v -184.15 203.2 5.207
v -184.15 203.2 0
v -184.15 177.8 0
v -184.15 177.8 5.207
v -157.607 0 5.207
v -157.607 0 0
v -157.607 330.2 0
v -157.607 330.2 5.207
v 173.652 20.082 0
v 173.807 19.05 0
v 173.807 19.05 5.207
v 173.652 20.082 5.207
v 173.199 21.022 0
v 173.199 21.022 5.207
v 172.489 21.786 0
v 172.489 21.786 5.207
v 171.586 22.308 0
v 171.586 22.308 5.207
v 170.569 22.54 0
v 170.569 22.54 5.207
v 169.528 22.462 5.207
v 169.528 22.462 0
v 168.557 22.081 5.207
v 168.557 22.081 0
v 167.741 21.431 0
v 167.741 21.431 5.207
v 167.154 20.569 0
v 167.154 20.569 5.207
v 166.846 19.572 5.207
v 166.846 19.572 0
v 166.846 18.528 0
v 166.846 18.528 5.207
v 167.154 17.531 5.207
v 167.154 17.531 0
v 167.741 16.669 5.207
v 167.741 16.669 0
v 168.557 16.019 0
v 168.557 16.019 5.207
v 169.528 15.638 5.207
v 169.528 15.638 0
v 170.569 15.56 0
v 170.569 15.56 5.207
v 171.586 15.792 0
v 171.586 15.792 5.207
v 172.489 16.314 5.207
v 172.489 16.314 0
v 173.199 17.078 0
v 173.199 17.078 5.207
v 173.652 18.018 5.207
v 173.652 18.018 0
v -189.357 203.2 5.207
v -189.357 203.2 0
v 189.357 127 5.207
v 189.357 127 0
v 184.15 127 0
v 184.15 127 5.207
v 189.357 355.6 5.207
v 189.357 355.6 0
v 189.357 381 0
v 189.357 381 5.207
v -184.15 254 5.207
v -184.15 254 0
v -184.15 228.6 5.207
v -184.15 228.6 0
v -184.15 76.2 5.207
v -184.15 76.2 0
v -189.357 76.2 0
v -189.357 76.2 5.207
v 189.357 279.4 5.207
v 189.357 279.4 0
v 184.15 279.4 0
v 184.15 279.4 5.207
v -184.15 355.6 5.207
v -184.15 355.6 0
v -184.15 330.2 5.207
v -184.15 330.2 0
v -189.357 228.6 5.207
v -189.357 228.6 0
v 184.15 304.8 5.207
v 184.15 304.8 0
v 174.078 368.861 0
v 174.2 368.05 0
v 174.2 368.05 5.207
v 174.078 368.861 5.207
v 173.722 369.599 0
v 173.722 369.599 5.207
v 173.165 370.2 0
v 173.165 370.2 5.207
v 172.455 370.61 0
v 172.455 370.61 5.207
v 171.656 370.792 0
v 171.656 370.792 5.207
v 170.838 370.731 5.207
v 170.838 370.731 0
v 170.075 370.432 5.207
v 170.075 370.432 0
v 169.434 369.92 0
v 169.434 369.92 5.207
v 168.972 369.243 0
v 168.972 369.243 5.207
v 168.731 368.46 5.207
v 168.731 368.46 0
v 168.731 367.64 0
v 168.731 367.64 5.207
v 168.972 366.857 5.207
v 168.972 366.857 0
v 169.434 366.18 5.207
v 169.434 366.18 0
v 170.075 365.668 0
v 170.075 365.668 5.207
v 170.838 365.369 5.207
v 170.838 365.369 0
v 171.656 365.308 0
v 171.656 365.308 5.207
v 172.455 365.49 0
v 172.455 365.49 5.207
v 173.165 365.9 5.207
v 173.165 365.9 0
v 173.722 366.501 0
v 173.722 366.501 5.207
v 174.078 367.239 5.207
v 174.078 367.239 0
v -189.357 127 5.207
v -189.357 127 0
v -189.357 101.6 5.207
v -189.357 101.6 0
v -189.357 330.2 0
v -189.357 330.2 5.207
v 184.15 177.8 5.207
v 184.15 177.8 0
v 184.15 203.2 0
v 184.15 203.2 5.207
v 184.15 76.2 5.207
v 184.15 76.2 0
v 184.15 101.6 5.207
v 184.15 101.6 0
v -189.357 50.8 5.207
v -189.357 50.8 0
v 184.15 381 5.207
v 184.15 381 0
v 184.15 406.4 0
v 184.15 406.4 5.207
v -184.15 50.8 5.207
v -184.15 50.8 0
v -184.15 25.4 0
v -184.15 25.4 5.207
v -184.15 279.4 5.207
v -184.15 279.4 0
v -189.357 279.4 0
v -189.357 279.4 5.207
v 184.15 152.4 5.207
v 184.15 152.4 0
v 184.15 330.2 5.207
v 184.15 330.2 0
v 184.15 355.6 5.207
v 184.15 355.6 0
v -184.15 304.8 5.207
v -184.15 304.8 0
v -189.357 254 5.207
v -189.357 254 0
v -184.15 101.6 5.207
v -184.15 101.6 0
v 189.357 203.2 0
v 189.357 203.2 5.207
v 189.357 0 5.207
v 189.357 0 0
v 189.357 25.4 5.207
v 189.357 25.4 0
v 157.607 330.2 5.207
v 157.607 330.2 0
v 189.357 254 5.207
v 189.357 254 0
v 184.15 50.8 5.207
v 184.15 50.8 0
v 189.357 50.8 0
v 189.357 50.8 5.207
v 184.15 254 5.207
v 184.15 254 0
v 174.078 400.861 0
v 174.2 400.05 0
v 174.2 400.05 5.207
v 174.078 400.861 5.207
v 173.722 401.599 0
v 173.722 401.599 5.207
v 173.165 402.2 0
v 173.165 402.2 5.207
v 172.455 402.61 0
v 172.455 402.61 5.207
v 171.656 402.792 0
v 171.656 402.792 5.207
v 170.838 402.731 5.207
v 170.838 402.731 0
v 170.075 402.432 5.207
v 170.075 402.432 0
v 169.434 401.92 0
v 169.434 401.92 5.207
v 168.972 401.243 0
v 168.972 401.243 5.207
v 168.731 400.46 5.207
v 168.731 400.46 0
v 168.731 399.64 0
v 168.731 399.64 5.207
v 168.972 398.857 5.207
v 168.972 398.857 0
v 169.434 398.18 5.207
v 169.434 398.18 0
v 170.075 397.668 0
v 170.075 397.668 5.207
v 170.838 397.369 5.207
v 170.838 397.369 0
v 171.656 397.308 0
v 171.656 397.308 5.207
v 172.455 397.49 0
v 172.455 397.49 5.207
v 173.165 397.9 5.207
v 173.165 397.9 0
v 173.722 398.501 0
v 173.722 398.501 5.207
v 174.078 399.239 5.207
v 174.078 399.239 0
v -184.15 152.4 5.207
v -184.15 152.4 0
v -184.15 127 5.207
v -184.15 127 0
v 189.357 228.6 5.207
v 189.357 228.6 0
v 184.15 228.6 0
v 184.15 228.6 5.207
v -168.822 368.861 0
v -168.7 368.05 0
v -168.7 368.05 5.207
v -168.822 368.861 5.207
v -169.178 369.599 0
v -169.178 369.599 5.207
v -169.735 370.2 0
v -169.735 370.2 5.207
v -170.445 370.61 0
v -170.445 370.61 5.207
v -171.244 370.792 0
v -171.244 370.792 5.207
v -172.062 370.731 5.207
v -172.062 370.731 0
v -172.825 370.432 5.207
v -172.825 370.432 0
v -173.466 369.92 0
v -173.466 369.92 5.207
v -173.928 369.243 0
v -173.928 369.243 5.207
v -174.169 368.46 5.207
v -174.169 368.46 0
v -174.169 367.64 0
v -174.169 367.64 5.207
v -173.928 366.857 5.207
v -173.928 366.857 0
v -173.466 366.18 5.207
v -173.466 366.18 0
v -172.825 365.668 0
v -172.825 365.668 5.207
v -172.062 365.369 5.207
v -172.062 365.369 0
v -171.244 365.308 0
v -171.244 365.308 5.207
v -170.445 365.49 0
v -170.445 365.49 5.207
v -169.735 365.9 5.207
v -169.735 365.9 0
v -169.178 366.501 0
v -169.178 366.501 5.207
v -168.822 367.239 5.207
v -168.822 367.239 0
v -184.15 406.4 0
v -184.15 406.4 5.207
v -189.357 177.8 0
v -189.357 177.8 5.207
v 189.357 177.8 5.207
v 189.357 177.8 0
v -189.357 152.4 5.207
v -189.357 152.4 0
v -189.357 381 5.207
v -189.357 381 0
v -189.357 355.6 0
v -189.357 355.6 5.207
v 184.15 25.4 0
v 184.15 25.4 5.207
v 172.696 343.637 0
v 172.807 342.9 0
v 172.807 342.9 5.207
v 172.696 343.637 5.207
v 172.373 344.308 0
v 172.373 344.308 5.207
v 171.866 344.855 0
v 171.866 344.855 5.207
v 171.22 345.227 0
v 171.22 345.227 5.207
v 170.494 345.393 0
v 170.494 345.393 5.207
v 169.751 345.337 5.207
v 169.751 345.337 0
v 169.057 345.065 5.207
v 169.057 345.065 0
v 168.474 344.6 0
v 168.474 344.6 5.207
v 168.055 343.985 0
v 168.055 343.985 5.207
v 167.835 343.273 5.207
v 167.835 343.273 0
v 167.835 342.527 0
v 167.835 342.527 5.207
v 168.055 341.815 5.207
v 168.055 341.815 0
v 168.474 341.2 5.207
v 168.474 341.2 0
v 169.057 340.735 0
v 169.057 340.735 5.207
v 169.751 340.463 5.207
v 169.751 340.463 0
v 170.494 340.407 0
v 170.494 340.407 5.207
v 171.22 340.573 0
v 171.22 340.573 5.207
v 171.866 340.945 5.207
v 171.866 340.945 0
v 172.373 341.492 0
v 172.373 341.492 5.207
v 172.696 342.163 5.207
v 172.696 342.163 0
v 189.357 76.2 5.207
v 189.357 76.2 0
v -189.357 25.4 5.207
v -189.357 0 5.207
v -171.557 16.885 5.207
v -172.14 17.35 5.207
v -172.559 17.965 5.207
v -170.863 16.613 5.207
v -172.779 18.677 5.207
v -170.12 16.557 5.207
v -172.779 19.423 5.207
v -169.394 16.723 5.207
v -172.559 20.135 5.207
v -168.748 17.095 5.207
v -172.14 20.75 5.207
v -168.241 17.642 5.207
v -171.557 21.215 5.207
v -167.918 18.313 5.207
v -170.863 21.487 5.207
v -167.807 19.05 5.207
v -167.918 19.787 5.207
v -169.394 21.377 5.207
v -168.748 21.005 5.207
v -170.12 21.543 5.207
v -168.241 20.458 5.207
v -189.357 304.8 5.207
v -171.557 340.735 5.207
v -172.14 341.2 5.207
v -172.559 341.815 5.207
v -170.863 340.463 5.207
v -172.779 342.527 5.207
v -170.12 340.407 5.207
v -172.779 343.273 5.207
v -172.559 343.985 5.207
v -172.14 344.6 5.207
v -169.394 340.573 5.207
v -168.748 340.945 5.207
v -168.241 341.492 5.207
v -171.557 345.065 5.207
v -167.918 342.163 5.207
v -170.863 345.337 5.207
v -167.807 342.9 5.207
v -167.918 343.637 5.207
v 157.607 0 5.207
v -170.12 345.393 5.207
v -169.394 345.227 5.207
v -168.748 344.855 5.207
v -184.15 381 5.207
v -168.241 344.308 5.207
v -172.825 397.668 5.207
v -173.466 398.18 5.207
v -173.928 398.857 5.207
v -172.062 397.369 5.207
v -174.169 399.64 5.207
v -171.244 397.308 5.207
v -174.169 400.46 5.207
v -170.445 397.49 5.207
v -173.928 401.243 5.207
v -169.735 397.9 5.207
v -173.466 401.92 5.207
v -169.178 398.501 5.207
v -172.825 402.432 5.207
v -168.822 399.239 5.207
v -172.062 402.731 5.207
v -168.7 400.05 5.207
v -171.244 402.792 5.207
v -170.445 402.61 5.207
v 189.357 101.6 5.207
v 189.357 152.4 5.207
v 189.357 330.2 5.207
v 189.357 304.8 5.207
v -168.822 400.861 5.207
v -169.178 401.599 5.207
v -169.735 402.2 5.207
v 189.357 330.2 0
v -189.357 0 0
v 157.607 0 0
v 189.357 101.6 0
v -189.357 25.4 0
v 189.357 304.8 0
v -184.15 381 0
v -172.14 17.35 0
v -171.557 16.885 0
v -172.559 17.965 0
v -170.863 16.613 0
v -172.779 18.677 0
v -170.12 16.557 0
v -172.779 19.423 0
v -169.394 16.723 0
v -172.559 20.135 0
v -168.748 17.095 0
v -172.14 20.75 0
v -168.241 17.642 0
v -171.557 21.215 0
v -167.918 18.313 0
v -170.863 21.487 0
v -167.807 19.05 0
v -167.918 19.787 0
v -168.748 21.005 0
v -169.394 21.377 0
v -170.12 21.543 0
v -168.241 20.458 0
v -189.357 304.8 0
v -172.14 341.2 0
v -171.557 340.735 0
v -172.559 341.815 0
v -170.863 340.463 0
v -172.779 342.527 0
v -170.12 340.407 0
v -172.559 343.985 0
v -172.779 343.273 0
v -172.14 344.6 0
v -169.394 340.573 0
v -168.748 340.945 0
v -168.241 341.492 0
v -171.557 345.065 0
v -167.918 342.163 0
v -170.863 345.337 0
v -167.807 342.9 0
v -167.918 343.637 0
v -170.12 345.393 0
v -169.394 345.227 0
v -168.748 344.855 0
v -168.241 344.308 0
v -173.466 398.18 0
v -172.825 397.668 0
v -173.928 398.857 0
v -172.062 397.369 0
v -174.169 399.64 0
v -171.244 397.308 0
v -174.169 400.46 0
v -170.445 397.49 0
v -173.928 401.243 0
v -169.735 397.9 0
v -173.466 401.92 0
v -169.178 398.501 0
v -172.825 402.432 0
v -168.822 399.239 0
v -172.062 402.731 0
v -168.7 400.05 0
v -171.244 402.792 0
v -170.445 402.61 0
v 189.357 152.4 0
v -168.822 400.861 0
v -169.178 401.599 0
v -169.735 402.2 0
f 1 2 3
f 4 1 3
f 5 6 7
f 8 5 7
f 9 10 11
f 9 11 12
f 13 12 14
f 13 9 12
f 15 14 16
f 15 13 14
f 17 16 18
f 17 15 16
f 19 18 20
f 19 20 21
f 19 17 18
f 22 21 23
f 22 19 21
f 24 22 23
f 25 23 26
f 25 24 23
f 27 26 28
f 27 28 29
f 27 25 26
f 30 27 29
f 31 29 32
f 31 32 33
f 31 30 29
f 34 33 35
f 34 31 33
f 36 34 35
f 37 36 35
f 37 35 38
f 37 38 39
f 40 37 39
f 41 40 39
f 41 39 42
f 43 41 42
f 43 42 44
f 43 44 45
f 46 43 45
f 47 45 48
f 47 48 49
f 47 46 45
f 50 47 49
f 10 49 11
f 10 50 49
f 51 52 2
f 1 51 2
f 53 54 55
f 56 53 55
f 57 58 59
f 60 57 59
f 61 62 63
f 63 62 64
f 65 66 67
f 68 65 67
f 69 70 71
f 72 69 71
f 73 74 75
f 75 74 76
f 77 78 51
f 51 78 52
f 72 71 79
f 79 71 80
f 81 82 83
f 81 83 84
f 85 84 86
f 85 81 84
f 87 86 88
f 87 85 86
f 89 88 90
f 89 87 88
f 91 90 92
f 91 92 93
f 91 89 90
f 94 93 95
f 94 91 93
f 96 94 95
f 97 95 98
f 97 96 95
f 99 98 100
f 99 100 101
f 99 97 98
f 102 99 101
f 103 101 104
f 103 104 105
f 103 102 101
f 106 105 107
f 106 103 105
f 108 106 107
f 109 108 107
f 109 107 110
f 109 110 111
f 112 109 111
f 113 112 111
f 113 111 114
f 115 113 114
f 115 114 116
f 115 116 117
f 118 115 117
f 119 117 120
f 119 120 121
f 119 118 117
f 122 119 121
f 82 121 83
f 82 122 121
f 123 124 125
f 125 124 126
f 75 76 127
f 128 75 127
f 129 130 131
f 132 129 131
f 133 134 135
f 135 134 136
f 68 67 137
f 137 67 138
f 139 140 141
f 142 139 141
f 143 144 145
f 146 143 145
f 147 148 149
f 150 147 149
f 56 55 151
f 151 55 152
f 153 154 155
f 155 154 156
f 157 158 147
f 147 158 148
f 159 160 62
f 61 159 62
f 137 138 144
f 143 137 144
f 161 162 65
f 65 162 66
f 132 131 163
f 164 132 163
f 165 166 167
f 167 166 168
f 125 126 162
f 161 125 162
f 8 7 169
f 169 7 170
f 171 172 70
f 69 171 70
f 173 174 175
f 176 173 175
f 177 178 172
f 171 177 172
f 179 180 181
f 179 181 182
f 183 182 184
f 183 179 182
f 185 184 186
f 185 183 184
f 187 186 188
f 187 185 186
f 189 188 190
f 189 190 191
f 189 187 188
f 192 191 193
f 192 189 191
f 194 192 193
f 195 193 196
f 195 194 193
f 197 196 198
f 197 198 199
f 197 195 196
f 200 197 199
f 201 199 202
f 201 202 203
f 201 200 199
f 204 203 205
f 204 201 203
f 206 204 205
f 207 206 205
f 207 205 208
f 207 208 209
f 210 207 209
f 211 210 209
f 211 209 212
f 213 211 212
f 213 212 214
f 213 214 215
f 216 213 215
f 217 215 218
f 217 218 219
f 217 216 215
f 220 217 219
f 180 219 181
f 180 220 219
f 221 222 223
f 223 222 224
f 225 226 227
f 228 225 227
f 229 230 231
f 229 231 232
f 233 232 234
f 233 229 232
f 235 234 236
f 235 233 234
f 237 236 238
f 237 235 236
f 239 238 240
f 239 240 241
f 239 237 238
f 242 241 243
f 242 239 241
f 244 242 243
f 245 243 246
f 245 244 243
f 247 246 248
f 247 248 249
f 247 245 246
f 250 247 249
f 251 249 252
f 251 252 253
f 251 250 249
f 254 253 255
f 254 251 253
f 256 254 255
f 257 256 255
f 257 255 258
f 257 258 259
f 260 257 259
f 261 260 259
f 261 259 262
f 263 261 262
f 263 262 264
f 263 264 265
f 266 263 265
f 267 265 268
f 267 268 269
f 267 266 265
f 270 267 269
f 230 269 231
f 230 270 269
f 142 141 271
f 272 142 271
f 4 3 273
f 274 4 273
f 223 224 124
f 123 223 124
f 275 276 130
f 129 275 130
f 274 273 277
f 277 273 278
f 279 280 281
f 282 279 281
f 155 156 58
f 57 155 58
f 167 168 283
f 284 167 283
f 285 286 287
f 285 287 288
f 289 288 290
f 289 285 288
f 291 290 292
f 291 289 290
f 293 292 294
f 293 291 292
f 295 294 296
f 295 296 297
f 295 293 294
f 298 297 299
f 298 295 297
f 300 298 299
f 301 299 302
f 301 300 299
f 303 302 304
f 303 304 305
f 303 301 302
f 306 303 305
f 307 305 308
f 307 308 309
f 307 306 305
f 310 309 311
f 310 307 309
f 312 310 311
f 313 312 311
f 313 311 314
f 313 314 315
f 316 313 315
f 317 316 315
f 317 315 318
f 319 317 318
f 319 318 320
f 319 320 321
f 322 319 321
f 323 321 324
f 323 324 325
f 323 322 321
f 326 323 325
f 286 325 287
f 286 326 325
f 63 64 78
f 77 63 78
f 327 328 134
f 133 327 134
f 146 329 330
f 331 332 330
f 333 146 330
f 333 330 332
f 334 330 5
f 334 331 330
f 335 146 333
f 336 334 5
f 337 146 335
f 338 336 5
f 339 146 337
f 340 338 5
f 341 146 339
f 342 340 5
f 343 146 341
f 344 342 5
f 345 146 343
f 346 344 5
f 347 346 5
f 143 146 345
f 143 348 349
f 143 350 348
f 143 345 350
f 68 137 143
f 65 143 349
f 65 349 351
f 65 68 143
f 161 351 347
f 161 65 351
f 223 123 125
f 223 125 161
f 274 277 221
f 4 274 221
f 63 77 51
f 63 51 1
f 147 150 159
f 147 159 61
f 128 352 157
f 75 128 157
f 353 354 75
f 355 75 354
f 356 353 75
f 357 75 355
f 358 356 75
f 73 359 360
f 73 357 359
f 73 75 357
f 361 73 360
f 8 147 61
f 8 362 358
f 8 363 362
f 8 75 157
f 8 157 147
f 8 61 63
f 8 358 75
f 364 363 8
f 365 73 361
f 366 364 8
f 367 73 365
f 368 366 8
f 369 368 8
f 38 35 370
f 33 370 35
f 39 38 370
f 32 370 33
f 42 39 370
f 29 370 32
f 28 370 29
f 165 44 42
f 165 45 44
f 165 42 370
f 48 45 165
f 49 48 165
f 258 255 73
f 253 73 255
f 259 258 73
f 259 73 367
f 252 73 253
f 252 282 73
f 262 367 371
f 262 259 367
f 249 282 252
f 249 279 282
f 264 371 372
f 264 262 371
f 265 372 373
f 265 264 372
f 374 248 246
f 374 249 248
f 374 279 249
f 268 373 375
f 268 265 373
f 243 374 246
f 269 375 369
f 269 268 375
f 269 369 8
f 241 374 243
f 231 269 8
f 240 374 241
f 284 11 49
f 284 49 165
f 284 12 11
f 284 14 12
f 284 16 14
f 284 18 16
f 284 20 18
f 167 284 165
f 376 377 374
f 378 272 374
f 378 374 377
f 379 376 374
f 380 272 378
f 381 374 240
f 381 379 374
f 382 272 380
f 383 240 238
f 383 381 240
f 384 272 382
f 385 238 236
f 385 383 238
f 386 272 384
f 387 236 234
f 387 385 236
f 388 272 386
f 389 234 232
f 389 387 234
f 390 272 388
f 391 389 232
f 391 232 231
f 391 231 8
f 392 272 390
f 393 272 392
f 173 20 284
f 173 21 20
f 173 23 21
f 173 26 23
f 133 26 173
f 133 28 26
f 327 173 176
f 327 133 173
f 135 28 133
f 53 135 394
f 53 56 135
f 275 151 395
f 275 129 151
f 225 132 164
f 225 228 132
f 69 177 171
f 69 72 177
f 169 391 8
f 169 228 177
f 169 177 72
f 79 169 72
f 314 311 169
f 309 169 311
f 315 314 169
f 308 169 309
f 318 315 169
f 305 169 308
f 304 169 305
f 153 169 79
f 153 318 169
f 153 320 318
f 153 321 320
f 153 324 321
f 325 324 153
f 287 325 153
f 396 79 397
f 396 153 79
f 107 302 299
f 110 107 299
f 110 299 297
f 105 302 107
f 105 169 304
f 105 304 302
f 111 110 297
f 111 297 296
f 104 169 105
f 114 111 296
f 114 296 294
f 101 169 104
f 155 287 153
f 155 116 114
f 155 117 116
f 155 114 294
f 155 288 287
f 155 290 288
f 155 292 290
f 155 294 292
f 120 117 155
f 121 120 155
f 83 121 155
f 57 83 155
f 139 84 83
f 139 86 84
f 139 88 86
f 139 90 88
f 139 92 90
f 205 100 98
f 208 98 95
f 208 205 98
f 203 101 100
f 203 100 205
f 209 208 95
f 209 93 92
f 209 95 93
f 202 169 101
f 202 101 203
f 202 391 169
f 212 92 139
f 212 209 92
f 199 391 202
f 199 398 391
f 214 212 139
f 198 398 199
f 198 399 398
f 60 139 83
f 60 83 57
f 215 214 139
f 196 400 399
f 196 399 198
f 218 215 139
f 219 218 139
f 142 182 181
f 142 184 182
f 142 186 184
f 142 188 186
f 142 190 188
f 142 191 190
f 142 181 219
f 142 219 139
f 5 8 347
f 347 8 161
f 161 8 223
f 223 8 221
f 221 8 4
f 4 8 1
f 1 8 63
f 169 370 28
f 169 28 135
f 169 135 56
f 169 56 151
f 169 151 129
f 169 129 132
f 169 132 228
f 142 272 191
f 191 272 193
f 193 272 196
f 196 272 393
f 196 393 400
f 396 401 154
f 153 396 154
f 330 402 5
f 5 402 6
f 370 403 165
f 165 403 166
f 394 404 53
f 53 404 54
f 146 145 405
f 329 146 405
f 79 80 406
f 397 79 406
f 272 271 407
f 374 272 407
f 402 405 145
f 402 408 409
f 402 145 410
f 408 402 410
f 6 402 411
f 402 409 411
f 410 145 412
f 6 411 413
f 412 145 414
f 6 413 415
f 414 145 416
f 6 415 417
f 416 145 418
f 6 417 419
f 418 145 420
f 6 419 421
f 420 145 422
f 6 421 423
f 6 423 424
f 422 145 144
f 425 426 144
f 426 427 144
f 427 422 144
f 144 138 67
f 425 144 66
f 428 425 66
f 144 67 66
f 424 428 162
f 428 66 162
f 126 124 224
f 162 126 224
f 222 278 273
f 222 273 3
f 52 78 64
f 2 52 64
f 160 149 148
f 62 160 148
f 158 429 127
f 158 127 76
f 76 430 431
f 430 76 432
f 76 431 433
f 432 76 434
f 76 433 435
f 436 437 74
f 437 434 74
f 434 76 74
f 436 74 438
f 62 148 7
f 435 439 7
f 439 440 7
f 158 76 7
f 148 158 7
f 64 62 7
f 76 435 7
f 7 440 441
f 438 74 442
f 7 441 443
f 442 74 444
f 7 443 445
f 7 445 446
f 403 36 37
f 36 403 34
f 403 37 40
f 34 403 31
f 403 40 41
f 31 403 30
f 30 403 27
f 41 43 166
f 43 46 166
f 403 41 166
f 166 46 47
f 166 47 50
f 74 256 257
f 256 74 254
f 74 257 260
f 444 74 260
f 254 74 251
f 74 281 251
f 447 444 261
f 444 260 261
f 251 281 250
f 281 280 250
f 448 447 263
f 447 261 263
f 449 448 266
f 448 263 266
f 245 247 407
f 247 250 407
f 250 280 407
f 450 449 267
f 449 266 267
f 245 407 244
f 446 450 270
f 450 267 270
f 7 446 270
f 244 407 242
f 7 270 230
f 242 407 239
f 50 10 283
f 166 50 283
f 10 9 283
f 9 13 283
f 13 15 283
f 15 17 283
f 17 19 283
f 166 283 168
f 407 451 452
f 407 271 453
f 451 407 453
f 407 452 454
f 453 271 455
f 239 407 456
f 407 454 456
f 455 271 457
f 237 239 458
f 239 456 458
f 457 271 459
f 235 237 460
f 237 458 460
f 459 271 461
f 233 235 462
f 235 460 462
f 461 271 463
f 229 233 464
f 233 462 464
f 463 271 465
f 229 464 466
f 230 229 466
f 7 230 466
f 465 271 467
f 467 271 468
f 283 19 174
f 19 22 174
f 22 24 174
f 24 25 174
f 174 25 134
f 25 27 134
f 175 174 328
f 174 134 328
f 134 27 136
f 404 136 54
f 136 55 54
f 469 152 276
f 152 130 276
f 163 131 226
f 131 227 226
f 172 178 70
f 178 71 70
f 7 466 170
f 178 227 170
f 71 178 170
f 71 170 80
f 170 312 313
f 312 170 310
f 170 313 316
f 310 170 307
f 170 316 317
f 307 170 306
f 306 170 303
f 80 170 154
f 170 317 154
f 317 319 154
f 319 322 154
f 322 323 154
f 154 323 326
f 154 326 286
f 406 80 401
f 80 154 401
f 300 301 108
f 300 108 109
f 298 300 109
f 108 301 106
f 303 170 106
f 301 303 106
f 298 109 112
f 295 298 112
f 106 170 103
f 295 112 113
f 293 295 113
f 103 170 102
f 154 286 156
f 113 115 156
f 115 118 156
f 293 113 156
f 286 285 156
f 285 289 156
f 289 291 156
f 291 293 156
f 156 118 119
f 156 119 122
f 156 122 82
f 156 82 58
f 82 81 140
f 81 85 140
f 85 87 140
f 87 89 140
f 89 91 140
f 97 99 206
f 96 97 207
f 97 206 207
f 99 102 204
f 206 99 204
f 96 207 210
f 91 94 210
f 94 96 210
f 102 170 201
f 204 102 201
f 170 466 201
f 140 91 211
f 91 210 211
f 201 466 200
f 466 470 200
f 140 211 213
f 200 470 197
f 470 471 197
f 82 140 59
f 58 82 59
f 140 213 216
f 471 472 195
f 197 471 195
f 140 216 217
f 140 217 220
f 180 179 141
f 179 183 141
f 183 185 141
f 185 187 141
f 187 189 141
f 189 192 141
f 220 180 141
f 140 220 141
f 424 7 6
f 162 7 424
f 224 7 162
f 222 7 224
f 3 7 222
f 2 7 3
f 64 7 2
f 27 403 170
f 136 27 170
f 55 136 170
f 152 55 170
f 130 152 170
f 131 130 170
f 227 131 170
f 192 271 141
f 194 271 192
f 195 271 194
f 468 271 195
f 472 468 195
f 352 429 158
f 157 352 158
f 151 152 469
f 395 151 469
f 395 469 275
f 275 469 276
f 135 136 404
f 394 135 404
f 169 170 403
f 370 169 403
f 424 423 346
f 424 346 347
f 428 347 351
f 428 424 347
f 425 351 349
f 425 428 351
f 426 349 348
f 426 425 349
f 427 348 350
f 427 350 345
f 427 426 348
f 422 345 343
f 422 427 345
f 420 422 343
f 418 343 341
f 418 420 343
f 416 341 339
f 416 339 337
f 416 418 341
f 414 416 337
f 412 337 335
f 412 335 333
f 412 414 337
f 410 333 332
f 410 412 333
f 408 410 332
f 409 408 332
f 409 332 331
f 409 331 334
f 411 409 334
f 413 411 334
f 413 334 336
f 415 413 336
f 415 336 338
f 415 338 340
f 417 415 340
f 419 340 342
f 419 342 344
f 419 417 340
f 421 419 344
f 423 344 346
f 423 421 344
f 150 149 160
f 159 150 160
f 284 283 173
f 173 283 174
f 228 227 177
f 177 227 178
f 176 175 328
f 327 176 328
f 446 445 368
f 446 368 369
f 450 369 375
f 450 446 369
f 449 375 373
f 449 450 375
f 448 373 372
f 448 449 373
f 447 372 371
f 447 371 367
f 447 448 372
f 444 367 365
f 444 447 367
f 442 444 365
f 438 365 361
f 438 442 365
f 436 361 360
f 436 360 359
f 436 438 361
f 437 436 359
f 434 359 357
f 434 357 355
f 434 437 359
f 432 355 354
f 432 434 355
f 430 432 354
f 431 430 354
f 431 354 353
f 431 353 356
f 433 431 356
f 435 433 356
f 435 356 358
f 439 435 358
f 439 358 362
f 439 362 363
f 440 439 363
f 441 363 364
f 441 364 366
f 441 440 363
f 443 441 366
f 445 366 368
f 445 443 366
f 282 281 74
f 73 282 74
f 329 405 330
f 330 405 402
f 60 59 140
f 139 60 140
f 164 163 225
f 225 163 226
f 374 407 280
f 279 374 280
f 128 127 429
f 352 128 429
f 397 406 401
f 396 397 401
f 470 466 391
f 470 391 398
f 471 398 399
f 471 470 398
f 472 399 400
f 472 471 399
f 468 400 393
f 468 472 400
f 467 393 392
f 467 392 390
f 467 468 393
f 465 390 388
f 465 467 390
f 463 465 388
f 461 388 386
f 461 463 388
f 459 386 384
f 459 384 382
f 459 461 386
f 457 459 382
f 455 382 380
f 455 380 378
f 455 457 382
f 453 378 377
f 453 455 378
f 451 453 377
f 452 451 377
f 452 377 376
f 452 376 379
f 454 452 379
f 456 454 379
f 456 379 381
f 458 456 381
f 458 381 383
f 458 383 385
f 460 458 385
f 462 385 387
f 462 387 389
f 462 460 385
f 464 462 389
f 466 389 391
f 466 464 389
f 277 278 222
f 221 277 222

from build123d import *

# Parameters (mm, degrees)
SKETCH1_R           = 2.5
SKETCH1_R_2         = 3.5
SKETCH1_R_3         = 2.75
BOSS_EXTRUDE1_DEPTH = 5.207


with BuildPart() as part:
    # Sketch1 → Boss-Extrude1 (new body)
    with BuildSketch(Plane.XY):
        Polygon((-189.357, 25.4), (-189.357, 0), (-157.607, 0), (-157.607, 330.2), (157.607, 330.2), (157.607, 0), (189.357, 0), (189.357, 25.4), (184.15, 25.4), (184.15, 50.8), (189.357, 50.8), (189.357, 76.2), (184.15, 76.2), (184.15, 101.6), (189.357, 101.6), (189.357, 127), (184.15, 127), (184.15, 152.4), (189.357, 152.4), (189.357, 177.8), (184.15, 177.8), (184.15, 203.2), (189.357, 203.2), (189.357, 228.6), (184.15, 228.6), (184.15, 254), (189.357, 254), (189.357, 279.4), (184.15, 279.4), (184.15, 304.8), (189.357, 304.8), (189.357, 330.2), (184.15, 330.2), (184.15, 355.6), (189.357, 355.6), (189.357, 381), (184.15, 381), (184.15, 406.4), (-184.15, 406.4), (-184.15, 381), (-189.357, 381), (-189.357, 355.6), (-184.15, 355.6), (-184.15, 330.2), (-189.357, 330.2), (-189.357, 304.8), (-184.15, 304.8), (-184.15, 279.4), (-189.357, 279.4), (-189.357, 254), (-184.15, 254), (-184.15, 228.6), (-189.357, 228.6), (-189.357, 203.2), (-184.15, 203.2), (-184.15, 177.8), (-189.357, 177.8), (-189.357, 152.4), (-184.15, 152.4), (-184.15, 127), (-189.357, 127), (-189.357, 101.6), (-184.15, 101.6), (-184.15, 76.2), (-189.357, 76.2), (-189.357, 50.8), (-184.15, 50.8), (-184.15, 25.4), align=None)
        with Locations((-170.307, 19.05)):
            Circle(SKETCH1_R, mode=Mode.SUBTRACT)
        with Locations((170.307, 19.05)):
            Circle(SKETCH1_R_2, mode=Mode.SUBTRACT)
        with Locations((-170.307, 342.9)):
            Circle(SKETCH1_R, mode=Mode.SUBTRACT)
        with Locations((-171.45, 368.05)):
            Circle(SKETCH1_R_3, mode=Mode.SUBTRACT)
        with Locations((-171.45, 400.05)):
            Circle(SKETCH1_R_3, mode=Mode.SUBTRACT)
        with Locations((170.307, 342.9)):
            Circle(SKETCH1_R, mode=Mode.SUBTRACT)
        with Locations((171.45, 368.05)):
            Circle(SKETCH1_R_3, mode=Mode.SUBTRACT)
        with Locations((171.45, 400.05)):
            Circle(SKETCH1_R_3, mode=Mode.SUBTRACT)
    extrude(amount=BOSS_EXTRUDE1_DEPTH)


solid = part.part
